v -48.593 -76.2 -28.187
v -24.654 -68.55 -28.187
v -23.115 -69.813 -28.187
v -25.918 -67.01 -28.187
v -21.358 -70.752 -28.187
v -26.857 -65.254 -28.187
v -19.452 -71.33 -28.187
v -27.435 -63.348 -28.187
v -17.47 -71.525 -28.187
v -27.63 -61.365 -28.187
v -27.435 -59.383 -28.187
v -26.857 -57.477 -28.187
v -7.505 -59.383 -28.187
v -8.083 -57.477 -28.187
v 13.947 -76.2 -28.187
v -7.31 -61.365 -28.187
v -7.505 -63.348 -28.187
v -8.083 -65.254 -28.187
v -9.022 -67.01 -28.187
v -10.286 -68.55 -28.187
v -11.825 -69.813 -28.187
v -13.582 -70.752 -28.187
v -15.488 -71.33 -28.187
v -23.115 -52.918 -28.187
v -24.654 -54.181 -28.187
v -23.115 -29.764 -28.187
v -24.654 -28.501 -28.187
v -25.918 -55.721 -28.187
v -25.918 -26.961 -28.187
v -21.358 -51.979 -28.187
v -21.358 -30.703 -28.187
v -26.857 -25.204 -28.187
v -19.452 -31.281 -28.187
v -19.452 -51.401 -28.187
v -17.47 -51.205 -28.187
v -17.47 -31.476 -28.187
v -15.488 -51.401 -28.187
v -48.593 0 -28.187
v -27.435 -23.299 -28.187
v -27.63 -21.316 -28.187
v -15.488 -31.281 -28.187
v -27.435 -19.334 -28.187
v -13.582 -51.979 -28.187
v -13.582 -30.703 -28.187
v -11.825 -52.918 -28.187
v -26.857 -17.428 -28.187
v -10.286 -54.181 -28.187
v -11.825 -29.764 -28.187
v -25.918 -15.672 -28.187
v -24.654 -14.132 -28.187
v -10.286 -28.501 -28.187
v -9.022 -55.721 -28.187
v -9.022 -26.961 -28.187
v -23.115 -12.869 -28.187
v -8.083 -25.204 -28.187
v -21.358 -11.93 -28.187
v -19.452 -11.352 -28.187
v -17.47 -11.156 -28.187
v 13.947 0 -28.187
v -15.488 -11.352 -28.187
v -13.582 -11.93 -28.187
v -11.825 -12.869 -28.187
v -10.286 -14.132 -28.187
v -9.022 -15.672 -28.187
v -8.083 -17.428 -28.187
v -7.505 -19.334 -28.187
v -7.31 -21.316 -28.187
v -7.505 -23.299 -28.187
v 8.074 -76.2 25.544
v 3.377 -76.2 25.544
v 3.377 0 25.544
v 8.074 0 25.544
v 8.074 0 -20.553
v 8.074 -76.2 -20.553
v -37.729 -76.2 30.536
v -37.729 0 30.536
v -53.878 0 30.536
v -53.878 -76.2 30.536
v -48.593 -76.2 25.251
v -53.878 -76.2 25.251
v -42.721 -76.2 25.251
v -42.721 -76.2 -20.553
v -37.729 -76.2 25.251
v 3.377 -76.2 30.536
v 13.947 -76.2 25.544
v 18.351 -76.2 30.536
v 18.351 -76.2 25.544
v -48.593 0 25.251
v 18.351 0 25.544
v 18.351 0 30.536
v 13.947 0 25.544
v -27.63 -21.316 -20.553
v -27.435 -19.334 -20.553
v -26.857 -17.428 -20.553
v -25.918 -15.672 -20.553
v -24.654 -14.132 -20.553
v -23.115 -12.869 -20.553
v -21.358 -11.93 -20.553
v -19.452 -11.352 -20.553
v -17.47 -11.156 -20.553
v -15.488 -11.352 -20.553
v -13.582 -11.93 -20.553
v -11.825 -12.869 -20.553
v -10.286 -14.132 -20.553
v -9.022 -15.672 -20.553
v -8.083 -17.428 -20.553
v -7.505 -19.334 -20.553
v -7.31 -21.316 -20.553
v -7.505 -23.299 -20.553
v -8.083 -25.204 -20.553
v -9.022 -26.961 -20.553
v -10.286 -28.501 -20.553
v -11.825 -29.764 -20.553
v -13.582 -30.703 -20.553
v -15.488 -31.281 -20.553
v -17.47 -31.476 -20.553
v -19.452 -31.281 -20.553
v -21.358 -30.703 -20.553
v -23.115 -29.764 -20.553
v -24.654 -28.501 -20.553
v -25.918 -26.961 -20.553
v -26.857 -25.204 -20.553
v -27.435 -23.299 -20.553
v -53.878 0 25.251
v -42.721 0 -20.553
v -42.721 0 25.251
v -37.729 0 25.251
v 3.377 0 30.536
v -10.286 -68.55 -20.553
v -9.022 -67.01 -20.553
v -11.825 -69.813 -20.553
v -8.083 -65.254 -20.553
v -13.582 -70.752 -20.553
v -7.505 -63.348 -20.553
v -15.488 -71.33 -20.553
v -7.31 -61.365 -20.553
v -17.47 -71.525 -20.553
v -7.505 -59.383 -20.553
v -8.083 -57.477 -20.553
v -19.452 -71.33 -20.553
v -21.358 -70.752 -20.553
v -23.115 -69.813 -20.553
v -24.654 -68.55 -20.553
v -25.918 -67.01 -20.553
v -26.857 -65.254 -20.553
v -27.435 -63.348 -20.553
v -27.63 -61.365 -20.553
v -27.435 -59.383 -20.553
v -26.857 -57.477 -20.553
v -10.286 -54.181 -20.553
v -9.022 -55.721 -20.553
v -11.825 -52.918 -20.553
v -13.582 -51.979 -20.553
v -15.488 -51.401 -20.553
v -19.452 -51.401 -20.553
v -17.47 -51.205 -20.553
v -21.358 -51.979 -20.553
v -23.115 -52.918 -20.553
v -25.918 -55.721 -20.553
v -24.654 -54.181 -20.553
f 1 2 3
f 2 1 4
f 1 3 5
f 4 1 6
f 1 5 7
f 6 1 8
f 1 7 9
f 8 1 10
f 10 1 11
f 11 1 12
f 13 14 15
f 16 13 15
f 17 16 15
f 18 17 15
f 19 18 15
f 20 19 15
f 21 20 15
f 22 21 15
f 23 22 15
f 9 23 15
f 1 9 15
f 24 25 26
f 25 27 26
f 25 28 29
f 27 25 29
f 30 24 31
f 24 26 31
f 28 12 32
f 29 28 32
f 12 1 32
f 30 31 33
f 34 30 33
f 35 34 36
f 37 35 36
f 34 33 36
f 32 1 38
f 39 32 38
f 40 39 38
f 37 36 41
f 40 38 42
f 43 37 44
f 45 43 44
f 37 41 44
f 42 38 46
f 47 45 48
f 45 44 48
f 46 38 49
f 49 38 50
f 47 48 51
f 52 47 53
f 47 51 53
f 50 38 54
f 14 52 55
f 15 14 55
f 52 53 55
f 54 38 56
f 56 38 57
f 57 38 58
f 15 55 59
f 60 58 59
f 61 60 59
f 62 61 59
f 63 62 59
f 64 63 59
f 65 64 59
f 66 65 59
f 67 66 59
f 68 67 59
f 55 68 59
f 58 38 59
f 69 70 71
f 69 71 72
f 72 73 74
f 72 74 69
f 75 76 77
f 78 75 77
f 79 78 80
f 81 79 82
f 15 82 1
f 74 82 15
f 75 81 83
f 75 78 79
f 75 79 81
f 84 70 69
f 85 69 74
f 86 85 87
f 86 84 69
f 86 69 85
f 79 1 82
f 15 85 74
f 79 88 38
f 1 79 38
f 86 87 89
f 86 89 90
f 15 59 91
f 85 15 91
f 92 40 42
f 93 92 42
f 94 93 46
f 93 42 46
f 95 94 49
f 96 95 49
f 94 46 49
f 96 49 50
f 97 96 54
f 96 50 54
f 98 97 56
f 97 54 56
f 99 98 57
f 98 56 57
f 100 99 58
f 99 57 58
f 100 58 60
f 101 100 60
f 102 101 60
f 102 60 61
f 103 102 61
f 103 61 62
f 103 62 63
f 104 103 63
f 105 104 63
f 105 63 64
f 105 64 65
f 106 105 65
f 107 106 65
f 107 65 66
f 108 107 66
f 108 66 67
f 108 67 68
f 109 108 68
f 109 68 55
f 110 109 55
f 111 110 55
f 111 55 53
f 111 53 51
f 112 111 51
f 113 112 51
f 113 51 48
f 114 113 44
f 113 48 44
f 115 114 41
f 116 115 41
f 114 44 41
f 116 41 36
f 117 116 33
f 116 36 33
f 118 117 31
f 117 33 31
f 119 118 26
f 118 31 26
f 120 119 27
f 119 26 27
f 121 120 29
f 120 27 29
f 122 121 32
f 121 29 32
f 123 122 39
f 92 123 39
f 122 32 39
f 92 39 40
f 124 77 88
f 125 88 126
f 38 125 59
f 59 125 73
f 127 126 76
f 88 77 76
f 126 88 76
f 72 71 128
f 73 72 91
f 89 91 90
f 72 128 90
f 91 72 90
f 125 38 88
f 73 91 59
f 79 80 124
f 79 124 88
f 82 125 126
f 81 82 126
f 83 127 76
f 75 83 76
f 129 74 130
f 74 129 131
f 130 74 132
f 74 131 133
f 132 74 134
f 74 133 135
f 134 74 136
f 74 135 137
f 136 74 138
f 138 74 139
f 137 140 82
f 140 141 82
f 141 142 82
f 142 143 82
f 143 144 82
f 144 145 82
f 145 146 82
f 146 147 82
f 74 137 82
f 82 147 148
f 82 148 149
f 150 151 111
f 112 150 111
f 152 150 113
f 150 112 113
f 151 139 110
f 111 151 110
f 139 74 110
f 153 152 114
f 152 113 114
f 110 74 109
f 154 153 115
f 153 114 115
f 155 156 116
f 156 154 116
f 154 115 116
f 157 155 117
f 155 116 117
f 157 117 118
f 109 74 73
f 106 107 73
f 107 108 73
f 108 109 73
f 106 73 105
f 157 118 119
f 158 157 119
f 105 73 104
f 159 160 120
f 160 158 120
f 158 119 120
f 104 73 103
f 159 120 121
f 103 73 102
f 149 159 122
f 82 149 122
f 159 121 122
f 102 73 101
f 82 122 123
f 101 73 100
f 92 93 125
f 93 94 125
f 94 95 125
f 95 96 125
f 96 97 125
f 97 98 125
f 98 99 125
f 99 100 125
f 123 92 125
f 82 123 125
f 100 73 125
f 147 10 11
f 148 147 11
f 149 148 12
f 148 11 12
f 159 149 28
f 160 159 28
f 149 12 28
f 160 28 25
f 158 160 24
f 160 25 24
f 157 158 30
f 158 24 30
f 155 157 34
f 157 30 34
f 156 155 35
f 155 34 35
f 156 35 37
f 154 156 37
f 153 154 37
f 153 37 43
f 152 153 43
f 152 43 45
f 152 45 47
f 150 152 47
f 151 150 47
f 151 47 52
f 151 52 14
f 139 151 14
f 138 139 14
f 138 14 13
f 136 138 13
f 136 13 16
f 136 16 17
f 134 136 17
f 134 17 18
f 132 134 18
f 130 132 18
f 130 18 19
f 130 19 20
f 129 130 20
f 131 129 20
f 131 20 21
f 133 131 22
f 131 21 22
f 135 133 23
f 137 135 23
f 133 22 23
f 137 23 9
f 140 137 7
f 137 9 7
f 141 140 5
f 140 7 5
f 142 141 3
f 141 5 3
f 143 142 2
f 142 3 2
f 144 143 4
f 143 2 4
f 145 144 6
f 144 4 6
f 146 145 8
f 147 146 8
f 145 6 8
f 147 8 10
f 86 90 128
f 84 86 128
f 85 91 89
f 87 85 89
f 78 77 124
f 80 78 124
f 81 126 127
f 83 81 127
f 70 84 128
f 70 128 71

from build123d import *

# Parameters (mm, degrees)
F0_W     = 5.8722943068
F0_H     = 45.8038914949
F0_W_2   = 5.8722924441
F0_H_2   = 46.0975058377
F1_DEPTH = 76.2
F3_D     = 20.32


with BuildPart() as f1:
    # F0 (on Front) → F1 (new body)
    with BuildSketch(Plane.XZ):
        Polygon((-37.7294868231, 30.5359270424), (-53.8782961667, 30.5359270424), (-53.8782961667, 25.2508632839), (-48.5932305455, 25.2508632839), (-42.7209362388, 25.2508632839), (-37.7294868231, 25.2508632839), align=None)
        with Locations((-45.6570833921, 2.3489175364)):
            Rectangle(F0_W, F0_H)
        Polygon((-42.7209362388, -20.553028211), (-48.5932305455, -20.553028211), (-48.5932305455, -28.1870104373), (13.9466961846, -28.1870104373), (13.9466961846, -20.553028211), (8.0744037405, -20.553028211), align=None)
        with Locations((11.0105499625, 2.4957247078)):
            Rectangle(F0_W_2, F0_H_2)
        Polygon((3.3765700646, 25.5444776267), (8.0744037405, 25.5444776267), (13.9466961846, 25.5444776267), (18.350917846, 25.5444776267), (18.350917846, 30.5359270424), (3.3765700646, 30.5359270424), align=None)
    extrude(amount=F1_DEPTH)

    # F3 (through all)
    with Locations(Plane.XY.offset(-20.553028211)):
        with Locations((-17.4700734206, -21.3164253719), (-17.4700734206, -61.3654702902)):
            Hole(F3_D / 2)


solid = f1.part
